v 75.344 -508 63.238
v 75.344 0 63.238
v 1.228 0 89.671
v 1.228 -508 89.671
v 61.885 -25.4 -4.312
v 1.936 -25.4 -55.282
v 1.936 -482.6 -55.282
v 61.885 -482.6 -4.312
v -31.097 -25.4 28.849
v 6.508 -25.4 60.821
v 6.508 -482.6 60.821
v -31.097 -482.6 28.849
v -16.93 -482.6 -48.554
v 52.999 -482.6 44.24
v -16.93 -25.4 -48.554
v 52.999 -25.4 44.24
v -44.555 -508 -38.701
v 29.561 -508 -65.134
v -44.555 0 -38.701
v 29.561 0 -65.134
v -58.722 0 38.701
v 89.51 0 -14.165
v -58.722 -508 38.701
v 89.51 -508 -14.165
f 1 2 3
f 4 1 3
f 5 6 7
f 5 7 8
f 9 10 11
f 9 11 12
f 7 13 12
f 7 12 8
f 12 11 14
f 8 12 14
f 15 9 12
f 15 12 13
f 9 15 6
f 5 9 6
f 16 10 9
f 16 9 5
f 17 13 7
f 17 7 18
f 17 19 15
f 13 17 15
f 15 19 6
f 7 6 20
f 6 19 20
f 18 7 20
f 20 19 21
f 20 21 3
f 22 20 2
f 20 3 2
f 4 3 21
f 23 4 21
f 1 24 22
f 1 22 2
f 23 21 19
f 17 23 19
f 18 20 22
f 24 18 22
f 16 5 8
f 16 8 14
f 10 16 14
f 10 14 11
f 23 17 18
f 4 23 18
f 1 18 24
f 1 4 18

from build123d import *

# Parameters (mm, degrees)
F1_DEPTH = 508
F2_T     = -25.4


with BuildPart() as f1:
    # F0 (on Front) → F1 (new body)
    with BuildSketch(Plane.XZ):
        Polygon((-58.7216, 38.701411), (-44.555271, -38.701411), (29.560703, -65.13442), (89.510348, -14.164609), (75.344019, 63.238212), (1.228045, 89.671222), align=None)
    extrude(amount=F1_DEPTH)

    # F2
    f2_openings = [f1.faces().sort_by_distance(p)[0] for p in [
        (-7.497284, -254, -51.917915),
    ]]
    offset(amount=F2_T, openings=f2_openings)


solid = f1.part
